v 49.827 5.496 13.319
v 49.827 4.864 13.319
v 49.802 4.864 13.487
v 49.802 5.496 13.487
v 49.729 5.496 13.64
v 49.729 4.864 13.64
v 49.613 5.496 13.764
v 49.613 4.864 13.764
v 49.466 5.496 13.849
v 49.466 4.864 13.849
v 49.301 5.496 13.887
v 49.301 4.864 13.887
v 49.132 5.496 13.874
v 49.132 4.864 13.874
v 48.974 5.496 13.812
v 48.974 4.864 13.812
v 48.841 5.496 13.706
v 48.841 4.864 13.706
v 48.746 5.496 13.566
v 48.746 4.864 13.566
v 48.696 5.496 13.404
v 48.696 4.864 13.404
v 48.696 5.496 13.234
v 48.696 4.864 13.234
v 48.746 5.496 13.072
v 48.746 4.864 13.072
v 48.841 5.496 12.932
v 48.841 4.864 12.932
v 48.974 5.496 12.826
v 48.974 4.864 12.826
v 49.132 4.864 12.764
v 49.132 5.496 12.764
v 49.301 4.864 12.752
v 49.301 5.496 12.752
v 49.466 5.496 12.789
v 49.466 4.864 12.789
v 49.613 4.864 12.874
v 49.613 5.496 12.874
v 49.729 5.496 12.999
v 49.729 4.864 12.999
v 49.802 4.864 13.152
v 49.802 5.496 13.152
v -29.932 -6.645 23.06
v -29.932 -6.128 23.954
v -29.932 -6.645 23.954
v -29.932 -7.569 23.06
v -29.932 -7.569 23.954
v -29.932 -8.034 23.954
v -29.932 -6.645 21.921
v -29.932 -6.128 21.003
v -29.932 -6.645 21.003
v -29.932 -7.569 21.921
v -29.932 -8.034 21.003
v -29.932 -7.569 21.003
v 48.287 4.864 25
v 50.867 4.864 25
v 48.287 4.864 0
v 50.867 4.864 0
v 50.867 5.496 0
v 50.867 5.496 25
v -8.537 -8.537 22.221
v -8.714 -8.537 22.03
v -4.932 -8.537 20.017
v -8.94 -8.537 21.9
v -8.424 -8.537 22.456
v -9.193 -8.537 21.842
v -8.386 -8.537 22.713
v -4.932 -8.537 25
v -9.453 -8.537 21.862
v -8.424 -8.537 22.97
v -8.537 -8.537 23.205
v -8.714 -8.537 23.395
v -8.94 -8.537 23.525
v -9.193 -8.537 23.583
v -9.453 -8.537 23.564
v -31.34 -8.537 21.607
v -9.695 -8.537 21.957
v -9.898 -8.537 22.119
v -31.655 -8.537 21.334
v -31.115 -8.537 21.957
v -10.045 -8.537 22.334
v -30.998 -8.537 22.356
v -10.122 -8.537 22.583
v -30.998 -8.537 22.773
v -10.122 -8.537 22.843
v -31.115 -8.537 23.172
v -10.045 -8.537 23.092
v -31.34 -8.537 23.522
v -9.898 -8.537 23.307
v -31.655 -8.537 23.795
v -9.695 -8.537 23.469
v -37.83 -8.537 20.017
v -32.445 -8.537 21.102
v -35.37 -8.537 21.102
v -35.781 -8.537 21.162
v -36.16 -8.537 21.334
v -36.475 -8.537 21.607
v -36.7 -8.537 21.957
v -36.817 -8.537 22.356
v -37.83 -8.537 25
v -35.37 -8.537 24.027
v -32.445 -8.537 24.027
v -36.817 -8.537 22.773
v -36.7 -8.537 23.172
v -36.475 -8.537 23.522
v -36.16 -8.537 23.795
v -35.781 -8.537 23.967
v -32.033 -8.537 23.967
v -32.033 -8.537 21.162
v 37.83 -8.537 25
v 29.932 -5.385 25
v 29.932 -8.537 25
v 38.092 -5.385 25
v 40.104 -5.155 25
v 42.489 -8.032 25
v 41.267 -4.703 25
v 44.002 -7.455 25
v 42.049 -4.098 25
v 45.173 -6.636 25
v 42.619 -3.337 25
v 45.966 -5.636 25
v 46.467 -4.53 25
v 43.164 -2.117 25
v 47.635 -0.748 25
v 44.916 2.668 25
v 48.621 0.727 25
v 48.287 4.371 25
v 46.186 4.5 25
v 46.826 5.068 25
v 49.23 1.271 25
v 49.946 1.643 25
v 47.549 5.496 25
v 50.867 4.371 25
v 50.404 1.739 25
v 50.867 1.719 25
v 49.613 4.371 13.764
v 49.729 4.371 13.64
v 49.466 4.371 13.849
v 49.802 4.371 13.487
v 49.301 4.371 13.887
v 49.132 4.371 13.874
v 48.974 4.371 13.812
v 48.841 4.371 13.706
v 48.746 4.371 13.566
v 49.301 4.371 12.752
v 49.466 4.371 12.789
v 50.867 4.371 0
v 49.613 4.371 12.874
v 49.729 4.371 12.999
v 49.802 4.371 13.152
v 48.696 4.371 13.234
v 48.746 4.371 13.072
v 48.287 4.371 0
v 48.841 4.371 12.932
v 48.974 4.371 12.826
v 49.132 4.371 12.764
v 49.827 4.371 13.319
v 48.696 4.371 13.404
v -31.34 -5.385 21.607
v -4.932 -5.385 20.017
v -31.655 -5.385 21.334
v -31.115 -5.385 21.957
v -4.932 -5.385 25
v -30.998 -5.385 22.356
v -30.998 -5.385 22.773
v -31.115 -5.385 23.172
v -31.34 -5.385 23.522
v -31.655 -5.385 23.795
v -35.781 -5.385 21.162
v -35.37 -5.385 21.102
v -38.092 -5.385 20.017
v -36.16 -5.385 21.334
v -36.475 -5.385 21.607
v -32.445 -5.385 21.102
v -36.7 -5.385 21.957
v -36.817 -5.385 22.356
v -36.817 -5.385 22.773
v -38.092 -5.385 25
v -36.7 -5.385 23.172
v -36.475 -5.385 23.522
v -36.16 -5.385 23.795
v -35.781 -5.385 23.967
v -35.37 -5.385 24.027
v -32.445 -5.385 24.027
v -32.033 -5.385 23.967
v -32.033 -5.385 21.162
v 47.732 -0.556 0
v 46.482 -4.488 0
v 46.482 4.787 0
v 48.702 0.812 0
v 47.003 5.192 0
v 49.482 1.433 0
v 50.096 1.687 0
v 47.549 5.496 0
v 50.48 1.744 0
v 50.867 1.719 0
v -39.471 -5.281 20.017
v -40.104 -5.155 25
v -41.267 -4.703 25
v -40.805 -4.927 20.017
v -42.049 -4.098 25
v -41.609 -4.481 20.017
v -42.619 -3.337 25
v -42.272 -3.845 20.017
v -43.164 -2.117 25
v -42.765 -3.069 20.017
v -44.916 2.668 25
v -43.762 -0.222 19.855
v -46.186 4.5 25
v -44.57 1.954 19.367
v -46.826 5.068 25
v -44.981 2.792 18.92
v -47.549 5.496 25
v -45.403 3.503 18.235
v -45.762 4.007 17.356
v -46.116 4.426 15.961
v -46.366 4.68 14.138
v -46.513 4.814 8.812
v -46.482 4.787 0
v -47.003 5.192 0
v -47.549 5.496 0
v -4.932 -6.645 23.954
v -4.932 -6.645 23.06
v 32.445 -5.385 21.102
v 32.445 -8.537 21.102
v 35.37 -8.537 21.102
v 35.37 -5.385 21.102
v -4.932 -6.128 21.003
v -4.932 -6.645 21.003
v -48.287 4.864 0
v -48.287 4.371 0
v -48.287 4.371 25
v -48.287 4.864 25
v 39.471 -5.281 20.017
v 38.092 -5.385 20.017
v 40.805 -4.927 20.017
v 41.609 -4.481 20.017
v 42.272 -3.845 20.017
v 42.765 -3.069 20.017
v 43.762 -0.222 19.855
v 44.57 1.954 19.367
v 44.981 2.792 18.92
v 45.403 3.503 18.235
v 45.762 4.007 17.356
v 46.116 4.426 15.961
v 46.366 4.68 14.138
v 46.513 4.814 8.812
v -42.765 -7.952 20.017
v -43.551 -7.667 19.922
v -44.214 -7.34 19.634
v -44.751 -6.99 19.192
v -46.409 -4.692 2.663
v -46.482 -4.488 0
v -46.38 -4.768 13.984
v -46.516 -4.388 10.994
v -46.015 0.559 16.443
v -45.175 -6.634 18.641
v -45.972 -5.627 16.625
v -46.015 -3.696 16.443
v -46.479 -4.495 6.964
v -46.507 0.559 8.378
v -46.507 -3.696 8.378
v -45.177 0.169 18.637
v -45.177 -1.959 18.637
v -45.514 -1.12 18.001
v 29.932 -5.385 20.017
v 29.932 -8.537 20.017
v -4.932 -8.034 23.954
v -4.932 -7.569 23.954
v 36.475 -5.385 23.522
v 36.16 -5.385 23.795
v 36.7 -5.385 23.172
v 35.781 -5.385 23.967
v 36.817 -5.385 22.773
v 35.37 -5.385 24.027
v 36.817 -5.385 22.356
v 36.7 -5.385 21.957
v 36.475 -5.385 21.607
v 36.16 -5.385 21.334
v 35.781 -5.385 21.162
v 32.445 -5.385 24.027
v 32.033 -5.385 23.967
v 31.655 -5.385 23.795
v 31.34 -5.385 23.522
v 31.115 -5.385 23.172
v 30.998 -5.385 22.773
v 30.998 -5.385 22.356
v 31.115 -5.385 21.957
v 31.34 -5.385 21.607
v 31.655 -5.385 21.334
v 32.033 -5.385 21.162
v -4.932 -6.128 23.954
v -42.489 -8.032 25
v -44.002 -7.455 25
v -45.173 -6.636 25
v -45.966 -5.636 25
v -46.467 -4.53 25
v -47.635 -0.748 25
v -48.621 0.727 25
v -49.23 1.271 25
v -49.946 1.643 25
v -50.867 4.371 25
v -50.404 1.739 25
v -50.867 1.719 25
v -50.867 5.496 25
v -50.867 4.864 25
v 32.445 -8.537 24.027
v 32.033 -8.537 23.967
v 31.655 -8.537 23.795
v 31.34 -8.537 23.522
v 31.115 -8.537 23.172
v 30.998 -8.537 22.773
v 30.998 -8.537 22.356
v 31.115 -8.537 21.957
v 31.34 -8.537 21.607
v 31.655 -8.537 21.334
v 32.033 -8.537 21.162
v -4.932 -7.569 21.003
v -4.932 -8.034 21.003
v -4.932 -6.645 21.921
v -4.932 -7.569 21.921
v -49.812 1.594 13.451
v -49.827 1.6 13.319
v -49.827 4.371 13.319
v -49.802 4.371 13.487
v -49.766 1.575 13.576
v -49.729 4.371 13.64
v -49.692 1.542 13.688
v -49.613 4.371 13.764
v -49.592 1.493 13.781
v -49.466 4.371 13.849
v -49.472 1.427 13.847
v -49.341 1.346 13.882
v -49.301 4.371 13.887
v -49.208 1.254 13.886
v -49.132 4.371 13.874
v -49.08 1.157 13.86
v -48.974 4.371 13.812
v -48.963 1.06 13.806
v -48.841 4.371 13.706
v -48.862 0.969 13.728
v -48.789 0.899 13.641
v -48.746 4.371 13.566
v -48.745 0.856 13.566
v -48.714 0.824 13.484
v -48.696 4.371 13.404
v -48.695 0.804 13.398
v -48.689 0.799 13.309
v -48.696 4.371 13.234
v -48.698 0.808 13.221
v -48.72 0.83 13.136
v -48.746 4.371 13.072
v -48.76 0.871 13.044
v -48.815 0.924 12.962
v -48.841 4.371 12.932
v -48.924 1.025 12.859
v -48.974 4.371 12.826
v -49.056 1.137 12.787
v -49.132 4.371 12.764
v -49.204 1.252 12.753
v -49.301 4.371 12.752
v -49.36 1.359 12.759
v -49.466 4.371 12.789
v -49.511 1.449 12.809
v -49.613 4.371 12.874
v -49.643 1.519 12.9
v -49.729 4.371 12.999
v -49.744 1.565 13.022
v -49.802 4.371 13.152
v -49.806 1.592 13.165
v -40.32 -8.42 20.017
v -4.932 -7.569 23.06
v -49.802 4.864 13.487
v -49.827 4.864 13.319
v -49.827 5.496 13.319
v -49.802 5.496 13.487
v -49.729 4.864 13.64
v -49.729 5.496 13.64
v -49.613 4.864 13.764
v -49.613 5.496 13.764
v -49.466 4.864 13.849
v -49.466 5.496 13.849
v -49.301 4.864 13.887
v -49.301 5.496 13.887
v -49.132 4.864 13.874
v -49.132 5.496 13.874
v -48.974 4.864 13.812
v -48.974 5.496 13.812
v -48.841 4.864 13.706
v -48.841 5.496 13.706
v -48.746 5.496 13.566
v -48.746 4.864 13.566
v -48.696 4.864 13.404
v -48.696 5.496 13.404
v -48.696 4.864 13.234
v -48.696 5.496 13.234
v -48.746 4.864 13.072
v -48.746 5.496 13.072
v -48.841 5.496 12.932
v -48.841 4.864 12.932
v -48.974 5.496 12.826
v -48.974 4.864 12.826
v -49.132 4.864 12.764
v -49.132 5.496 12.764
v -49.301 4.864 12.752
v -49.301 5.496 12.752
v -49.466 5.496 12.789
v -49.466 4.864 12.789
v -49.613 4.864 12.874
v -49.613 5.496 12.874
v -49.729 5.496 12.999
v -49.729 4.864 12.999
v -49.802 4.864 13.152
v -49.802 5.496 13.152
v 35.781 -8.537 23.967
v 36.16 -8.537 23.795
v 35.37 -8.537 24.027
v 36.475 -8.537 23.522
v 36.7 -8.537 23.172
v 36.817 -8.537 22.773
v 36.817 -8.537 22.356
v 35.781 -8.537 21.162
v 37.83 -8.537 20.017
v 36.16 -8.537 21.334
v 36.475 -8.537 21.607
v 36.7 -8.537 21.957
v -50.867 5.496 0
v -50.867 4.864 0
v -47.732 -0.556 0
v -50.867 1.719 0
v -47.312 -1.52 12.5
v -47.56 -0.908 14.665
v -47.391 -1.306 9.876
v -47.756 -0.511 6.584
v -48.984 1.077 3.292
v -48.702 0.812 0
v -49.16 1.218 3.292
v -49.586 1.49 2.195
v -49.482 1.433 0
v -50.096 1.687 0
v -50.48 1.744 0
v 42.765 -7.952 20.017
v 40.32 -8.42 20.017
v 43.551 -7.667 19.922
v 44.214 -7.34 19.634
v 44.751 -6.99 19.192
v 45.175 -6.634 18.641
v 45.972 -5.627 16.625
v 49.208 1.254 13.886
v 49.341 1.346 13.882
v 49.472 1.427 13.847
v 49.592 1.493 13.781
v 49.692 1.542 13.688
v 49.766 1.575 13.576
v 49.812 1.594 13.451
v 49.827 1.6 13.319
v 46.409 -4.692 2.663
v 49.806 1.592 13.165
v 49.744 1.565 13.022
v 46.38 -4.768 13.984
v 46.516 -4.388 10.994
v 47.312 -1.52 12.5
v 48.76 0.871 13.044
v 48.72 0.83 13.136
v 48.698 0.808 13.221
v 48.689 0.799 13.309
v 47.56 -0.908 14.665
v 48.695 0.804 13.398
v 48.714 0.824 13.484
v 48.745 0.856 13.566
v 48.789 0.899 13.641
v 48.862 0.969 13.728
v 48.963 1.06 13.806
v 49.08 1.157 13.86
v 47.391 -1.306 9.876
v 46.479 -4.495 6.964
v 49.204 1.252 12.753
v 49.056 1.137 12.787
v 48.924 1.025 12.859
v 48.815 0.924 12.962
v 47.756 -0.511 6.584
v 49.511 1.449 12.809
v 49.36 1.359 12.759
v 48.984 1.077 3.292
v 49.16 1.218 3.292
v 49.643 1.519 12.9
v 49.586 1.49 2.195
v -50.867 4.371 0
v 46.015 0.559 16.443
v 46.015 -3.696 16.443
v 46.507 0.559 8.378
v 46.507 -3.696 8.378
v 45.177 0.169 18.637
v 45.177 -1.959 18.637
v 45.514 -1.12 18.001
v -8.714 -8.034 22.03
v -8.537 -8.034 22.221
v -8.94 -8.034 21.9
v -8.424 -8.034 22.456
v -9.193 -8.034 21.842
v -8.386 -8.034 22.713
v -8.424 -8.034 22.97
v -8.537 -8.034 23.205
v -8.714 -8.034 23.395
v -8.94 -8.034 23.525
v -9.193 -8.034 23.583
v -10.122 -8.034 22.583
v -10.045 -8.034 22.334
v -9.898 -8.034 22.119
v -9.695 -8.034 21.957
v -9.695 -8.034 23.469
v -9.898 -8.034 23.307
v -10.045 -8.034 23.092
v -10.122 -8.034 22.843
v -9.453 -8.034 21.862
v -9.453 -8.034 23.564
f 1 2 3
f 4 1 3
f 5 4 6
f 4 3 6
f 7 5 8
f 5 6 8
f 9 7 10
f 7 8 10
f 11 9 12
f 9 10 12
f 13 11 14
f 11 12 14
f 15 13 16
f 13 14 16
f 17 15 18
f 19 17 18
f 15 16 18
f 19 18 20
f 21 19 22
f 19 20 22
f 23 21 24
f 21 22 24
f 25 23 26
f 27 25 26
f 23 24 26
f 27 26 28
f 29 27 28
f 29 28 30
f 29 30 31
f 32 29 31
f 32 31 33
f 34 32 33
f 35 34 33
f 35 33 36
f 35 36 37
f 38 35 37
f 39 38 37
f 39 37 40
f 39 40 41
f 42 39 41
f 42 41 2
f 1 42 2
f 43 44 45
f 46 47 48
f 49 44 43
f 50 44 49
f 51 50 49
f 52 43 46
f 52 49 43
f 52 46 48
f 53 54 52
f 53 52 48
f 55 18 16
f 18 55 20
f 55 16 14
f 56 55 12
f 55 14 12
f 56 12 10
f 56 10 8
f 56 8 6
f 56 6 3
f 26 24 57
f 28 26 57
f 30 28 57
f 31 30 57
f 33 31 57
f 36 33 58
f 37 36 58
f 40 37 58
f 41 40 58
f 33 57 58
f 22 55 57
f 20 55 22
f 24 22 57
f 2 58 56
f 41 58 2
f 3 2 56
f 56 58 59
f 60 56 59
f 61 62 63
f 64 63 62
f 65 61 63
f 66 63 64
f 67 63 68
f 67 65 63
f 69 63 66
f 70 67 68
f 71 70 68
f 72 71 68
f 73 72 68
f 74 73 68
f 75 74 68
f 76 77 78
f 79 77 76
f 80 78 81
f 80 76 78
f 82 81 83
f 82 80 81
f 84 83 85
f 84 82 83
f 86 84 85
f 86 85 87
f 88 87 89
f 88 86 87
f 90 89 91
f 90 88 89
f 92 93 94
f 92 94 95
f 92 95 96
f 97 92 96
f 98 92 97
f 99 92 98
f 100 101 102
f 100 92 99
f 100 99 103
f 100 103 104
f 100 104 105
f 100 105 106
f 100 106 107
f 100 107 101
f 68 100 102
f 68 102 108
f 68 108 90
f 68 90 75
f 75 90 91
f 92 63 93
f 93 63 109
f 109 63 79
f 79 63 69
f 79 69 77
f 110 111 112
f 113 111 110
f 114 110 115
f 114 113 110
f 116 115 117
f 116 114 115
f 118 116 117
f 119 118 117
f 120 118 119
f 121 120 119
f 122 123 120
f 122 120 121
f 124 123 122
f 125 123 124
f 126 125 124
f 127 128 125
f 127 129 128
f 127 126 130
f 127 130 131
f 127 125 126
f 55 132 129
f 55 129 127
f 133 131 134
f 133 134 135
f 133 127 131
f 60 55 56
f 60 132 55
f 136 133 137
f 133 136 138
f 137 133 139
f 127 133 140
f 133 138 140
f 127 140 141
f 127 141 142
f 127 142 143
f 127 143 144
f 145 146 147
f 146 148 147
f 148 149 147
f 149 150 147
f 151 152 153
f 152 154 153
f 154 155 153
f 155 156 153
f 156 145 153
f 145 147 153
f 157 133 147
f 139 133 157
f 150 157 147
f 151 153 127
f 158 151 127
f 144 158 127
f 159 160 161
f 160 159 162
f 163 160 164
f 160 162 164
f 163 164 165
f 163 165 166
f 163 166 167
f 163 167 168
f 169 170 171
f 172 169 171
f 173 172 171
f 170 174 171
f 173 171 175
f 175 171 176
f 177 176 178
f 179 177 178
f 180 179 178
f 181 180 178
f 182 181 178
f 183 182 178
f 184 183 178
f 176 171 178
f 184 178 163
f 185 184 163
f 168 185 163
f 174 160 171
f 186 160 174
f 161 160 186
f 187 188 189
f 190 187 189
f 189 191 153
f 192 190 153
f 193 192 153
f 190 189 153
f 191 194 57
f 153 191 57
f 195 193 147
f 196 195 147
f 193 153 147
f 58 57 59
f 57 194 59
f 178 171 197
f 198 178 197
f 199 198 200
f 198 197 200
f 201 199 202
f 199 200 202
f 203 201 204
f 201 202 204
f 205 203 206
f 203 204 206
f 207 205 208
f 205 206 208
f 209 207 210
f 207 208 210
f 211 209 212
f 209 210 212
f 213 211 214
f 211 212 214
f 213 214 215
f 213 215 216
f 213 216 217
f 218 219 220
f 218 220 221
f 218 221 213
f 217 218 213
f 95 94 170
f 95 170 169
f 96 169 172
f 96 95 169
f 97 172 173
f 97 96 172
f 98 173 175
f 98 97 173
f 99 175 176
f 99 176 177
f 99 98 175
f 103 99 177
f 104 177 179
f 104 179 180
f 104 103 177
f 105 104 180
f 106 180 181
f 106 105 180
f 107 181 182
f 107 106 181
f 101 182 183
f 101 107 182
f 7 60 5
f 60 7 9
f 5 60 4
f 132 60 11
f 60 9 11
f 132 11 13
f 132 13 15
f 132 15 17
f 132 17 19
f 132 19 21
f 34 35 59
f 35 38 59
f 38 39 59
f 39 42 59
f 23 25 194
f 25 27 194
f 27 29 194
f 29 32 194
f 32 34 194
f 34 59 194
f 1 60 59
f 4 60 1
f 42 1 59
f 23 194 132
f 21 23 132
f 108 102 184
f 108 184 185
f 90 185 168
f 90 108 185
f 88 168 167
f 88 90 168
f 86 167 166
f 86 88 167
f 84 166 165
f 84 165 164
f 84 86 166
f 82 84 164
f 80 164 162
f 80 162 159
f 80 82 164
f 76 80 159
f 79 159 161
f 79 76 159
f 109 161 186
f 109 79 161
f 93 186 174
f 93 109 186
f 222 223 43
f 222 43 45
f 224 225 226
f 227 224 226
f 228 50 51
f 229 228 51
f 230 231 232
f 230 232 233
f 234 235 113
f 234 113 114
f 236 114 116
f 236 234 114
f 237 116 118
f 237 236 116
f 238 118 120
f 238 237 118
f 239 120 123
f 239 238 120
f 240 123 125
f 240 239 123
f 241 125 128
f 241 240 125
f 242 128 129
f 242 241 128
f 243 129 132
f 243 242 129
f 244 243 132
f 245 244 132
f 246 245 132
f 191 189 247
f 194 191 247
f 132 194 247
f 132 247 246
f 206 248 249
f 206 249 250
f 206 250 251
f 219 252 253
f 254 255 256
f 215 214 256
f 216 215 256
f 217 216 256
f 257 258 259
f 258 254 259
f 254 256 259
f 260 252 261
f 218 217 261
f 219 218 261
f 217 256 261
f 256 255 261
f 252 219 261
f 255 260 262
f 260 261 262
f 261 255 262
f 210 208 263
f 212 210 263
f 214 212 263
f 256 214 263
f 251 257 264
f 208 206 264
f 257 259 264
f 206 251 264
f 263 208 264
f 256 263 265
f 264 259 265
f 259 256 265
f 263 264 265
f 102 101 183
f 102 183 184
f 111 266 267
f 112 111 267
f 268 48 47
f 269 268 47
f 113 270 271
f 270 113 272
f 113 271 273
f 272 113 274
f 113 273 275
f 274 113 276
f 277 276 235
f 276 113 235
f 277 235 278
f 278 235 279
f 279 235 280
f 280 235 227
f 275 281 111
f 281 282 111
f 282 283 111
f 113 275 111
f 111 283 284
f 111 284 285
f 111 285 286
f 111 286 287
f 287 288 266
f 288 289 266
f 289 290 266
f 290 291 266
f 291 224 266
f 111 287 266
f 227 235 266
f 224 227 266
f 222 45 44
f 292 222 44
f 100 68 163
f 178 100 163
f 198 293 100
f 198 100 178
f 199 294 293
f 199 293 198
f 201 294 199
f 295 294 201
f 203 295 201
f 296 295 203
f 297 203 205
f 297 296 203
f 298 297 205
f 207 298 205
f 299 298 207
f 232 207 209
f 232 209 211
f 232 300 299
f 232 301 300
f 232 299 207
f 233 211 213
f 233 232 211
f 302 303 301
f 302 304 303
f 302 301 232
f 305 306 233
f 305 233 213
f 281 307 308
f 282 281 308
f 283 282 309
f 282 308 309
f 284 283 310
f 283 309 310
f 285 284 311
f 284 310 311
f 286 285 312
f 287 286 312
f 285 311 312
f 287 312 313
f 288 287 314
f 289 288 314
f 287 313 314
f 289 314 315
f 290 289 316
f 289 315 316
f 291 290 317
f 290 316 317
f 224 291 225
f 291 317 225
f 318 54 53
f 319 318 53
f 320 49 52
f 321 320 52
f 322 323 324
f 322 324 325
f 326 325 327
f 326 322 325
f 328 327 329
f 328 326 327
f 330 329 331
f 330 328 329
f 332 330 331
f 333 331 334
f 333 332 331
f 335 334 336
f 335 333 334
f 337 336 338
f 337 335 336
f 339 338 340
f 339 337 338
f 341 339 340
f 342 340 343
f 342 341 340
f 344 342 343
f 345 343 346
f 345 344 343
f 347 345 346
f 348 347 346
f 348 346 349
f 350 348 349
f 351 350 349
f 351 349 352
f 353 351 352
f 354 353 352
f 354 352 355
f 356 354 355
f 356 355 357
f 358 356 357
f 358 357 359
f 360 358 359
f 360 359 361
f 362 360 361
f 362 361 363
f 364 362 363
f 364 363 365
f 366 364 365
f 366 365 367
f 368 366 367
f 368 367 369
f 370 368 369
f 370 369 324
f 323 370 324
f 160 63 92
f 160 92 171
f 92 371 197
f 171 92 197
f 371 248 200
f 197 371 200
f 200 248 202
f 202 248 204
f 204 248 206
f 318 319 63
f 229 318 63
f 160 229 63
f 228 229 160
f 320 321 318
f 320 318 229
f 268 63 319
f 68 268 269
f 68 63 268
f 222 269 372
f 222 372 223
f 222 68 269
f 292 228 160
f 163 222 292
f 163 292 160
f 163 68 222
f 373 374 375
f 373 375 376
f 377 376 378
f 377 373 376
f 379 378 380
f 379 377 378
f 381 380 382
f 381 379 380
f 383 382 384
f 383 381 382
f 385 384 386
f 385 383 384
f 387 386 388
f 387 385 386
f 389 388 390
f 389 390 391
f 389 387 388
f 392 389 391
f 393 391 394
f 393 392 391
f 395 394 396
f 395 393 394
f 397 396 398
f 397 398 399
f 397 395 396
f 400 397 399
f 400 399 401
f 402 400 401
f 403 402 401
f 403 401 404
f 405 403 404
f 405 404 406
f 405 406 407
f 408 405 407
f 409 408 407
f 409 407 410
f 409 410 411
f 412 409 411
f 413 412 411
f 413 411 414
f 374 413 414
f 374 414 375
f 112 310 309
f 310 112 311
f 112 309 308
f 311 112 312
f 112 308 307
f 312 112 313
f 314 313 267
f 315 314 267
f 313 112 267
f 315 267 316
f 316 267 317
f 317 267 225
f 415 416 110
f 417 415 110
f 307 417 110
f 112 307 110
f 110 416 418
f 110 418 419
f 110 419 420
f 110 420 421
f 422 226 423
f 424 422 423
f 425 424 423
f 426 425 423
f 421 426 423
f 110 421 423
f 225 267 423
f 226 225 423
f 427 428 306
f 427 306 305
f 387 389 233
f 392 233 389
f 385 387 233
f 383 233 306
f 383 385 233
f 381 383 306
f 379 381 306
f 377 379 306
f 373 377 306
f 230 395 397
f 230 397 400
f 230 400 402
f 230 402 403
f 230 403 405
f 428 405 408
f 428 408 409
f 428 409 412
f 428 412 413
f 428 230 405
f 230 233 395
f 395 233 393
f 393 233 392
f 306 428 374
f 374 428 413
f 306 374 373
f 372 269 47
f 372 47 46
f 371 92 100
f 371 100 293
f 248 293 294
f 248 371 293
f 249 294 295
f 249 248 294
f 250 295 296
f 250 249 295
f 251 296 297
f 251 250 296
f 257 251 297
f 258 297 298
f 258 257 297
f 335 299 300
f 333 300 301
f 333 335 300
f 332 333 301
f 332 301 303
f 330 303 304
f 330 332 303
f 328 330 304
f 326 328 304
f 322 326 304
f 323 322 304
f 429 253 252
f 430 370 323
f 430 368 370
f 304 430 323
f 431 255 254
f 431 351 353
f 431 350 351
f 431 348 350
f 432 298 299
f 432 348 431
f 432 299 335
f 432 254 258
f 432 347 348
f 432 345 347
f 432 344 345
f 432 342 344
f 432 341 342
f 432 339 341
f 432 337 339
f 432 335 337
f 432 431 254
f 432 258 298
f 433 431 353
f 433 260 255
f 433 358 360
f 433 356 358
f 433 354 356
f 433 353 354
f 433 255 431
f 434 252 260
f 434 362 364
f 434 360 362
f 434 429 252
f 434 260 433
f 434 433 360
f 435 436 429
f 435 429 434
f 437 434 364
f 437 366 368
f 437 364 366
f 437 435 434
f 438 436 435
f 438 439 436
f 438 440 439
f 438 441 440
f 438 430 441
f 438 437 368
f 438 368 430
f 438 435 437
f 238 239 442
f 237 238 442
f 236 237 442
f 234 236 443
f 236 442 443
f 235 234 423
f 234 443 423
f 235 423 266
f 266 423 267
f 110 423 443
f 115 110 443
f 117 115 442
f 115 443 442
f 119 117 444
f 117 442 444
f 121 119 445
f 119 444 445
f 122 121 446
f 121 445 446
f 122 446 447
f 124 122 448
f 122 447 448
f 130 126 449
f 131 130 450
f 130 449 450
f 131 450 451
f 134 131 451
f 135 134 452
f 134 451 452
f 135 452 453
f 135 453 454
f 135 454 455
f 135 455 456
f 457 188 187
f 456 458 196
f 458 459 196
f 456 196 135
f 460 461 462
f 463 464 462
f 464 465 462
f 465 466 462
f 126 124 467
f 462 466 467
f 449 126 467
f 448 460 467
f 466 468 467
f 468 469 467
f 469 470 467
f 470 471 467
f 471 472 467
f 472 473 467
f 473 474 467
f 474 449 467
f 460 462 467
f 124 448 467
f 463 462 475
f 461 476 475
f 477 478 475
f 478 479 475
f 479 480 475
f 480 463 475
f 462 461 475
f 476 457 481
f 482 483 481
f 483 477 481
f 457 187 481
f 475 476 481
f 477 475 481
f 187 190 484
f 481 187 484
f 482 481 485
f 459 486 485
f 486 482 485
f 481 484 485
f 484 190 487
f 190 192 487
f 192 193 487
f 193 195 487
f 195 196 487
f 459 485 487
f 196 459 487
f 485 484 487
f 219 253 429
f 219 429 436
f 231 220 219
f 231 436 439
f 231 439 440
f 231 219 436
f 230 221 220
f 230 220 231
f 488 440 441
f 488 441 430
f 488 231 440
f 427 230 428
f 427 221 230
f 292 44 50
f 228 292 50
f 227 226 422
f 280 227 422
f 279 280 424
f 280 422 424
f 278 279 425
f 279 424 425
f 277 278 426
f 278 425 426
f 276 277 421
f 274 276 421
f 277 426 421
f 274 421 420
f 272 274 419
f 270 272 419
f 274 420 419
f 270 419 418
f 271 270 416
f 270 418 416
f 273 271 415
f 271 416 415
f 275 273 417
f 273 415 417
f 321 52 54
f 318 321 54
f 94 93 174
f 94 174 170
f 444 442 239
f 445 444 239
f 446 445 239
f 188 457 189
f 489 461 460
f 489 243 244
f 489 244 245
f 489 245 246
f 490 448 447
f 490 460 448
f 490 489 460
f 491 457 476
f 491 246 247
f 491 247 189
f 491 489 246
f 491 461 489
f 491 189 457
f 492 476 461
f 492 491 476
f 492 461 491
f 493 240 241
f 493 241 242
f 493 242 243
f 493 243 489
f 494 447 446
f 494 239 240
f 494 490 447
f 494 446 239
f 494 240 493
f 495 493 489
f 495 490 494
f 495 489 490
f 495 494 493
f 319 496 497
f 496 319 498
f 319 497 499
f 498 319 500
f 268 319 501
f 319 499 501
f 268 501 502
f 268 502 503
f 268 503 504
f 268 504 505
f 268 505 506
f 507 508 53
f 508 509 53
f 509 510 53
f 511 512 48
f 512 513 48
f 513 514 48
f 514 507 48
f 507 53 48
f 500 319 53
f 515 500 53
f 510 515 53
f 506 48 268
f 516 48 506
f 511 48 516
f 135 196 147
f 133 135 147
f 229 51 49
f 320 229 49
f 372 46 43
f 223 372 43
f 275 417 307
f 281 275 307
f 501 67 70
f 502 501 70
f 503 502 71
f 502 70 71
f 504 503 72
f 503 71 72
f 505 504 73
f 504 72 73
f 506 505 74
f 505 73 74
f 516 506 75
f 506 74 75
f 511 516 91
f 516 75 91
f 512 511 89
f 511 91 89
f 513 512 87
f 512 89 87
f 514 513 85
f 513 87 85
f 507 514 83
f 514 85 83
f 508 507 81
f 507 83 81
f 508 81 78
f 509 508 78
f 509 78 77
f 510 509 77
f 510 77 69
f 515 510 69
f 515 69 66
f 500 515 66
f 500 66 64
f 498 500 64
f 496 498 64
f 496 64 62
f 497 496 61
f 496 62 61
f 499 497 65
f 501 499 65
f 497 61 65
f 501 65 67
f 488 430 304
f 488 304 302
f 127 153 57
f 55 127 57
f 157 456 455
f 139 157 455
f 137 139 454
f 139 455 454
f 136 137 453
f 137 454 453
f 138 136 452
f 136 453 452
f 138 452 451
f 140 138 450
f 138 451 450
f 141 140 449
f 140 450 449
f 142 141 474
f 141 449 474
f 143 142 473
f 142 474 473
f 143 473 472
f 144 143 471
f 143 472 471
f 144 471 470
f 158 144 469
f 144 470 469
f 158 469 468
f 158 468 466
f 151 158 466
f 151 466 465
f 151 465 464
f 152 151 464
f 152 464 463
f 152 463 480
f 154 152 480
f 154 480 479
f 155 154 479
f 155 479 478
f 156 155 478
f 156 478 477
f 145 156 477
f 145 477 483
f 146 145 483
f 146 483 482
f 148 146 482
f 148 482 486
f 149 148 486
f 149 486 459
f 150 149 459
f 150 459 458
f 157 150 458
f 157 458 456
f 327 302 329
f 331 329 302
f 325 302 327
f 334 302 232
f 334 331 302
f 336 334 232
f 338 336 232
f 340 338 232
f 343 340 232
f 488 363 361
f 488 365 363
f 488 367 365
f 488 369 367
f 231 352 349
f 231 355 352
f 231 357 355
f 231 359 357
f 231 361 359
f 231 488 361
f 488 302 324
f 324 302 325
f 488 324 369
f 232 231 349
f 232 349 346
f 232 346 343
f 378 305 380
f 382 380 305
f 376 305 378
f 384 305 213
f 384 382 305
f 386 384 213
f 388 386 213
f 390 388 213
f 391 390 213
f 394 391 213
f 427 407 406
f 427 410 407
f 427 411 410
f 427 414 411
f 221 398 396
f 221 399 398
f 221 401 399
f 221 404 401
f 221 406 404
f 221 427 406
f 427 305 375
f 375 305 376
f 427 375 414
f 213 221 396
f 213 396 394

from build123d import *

# Parameters (mm, degrees)
F1_DEPTH = 25
F2_R     = 0.5691574729
F3_DEPTH = 25
F5_W     = 3.151708856
F5_H     = 4.9834471196
F6_DEPTH = 25
F7_R     = 0.8729634821
F8_DEPTH = 0.5032406053


with BuildPart() as f1:
    # F0 (on Top) → F1 (new body)
    with BuildSketch(Plane.XY):
        with BuildLine():
            Line((50.8666671813, 5.4964012992), (47.5485259414, 5.4964012992))
            add(Edge.make_bspline(
                [(38.0922677794, -5.3854089879), (42.6775189713, -5.3219218698), (43.0188064709, -1.2546433805), (45.6184373211, 4.6135282339), (47.5485259414, 5.4964012992)],
                knots=[0, 0, 0, 0, 0.4842694553, 0.8352208318, 0.8352208318, 0.8352208318, 0.8352208318], degree=3))
            Line((38.0922677794, -5.3854089879), (29.9323219806, -5.3854089879))
            Line((29.9323219806, -5.3854089879), (29.9323219806, -8.5371178439))
            Line((29.9323219806, -8.5371178439), (37.8296850544, -8.5371178439))
            add(Edge.make_bspline(
                [(37.8296850544, -8.5371178439), (46.9920461772, -8.5371178439), (45.7497731331, -2.0131561568), (49.4362264278, 1.9699170904), (50.8666671813, 1.7187654739)],
                knots=[0, 0, 0, 0, 0.6103006755, 1, 1, 1, 1], degree=3))
            Line((50.8666671813, 1.7187654739), (50.8666671813, 4.3712230399))
            Line((50.8666671813, 4.3712230399), (48.2869036496, 4.3712230399))
            Line((48.2869036496, 4.3712230399), (48.2869036496, 4.86399699))
            Line((48.2869036496, 4.86399699), (50.8666671813, 4.86399699))
            Line((50.8666671813, 4.86399699), (50.8666671813, 5.4964012992))
        make_face()
    extrude(amount=F1_DEPTH)

    # F2 (on face) → F3 (cut)
    with BuildSketch(Plane.XZ.offset(8.5371178439)):
        with BuildLine():
            Line((42.7652262151, 20.0165528804), (29.9323219806, 20.0165528804))
            Line((29.9323219806, 20.0165528804), (29.9323219806, 0))
            Line((29.9323219806, 0), (46.4819632471, 0))
            add(Edge.make_bspline(
                [(42.7652262151, 20.0165528804), (48.1412187219, 20.0829226524), (46.0173711181, 7.1407188661), (46.4819632471, 0)],
                knots=[0, 0, 0, 0, 20.3586965049, 20.3586965049, 20.3586965049, 20.3586965049], degree=3))
        make_face()
        with BuildLine():
            Line((35.3695498758, 24.0266271856), (32.4453003705, 24.0266271856))
            ThreePointArc((32.4453003705, 24.0266271856), (30.9831756178, 22.5645024329), (32.4453003705, 21.1023776803))
            Line((32.4453003705, 21.1023776803), (35.3695498758, 21.1023776803))
            ThreePointArc((35.3695498758, 21.1023776803), (36.8316746285, 22.5645024329), (35.3695498758, 24.0266271856))
        make_face()
        with Locations((49.258325249, 13.3192716166)):
            Circle(F2_R)
    extrude(amount=-F3_DEPTH, mode=Mode.SUBTRACT)


with BuildPart() as f4_1:
    # F4: instance of F1
    add(f1.part.mirror(Plane.YZ))

    # F5 (on face) → F6 (join)
    with BuildSketch(Plane.YZ.offset(-29.9323219806)):
        with Locations((-6.9612634159, 22.5082764402)):
            Rectangle(F5_W, F5_H)
        Polygon((-8.0338772386, 21.0032649338), (-8.0338772386, 23.9541586488), (-7.5688902289, 23.9541586488), (-7.5688902289, 23.0597723275), (-6.644862704, 23.0597723275), (-6.644862704, 23.9541586488), (-6.1279390939, 23.9541586488), (-6.1279390939, 21.0032649338), (-6.644862704, 21.0032649338), (-6.644862704, 21.9209678471), (-7.5688902289, 21.9209678471), (-7.5688902289, 21.0032649338), align=None, mode=Mode.SUBTRACT)
    extrude(amount=F6_DEPTH)

    # F7 (on face) → F8 (cut, through all)
    with BuildSketch(Plane.XZ.offset(8.5371178439)):
        with Locations((-9.2585654929, 22.7128434926)):
            Circle(F7_R)
    extrude(amount=-F8_DEPTH, mode=Mode.SUBTRACT)


solid = Compound([f1.part, f4_1.part])
